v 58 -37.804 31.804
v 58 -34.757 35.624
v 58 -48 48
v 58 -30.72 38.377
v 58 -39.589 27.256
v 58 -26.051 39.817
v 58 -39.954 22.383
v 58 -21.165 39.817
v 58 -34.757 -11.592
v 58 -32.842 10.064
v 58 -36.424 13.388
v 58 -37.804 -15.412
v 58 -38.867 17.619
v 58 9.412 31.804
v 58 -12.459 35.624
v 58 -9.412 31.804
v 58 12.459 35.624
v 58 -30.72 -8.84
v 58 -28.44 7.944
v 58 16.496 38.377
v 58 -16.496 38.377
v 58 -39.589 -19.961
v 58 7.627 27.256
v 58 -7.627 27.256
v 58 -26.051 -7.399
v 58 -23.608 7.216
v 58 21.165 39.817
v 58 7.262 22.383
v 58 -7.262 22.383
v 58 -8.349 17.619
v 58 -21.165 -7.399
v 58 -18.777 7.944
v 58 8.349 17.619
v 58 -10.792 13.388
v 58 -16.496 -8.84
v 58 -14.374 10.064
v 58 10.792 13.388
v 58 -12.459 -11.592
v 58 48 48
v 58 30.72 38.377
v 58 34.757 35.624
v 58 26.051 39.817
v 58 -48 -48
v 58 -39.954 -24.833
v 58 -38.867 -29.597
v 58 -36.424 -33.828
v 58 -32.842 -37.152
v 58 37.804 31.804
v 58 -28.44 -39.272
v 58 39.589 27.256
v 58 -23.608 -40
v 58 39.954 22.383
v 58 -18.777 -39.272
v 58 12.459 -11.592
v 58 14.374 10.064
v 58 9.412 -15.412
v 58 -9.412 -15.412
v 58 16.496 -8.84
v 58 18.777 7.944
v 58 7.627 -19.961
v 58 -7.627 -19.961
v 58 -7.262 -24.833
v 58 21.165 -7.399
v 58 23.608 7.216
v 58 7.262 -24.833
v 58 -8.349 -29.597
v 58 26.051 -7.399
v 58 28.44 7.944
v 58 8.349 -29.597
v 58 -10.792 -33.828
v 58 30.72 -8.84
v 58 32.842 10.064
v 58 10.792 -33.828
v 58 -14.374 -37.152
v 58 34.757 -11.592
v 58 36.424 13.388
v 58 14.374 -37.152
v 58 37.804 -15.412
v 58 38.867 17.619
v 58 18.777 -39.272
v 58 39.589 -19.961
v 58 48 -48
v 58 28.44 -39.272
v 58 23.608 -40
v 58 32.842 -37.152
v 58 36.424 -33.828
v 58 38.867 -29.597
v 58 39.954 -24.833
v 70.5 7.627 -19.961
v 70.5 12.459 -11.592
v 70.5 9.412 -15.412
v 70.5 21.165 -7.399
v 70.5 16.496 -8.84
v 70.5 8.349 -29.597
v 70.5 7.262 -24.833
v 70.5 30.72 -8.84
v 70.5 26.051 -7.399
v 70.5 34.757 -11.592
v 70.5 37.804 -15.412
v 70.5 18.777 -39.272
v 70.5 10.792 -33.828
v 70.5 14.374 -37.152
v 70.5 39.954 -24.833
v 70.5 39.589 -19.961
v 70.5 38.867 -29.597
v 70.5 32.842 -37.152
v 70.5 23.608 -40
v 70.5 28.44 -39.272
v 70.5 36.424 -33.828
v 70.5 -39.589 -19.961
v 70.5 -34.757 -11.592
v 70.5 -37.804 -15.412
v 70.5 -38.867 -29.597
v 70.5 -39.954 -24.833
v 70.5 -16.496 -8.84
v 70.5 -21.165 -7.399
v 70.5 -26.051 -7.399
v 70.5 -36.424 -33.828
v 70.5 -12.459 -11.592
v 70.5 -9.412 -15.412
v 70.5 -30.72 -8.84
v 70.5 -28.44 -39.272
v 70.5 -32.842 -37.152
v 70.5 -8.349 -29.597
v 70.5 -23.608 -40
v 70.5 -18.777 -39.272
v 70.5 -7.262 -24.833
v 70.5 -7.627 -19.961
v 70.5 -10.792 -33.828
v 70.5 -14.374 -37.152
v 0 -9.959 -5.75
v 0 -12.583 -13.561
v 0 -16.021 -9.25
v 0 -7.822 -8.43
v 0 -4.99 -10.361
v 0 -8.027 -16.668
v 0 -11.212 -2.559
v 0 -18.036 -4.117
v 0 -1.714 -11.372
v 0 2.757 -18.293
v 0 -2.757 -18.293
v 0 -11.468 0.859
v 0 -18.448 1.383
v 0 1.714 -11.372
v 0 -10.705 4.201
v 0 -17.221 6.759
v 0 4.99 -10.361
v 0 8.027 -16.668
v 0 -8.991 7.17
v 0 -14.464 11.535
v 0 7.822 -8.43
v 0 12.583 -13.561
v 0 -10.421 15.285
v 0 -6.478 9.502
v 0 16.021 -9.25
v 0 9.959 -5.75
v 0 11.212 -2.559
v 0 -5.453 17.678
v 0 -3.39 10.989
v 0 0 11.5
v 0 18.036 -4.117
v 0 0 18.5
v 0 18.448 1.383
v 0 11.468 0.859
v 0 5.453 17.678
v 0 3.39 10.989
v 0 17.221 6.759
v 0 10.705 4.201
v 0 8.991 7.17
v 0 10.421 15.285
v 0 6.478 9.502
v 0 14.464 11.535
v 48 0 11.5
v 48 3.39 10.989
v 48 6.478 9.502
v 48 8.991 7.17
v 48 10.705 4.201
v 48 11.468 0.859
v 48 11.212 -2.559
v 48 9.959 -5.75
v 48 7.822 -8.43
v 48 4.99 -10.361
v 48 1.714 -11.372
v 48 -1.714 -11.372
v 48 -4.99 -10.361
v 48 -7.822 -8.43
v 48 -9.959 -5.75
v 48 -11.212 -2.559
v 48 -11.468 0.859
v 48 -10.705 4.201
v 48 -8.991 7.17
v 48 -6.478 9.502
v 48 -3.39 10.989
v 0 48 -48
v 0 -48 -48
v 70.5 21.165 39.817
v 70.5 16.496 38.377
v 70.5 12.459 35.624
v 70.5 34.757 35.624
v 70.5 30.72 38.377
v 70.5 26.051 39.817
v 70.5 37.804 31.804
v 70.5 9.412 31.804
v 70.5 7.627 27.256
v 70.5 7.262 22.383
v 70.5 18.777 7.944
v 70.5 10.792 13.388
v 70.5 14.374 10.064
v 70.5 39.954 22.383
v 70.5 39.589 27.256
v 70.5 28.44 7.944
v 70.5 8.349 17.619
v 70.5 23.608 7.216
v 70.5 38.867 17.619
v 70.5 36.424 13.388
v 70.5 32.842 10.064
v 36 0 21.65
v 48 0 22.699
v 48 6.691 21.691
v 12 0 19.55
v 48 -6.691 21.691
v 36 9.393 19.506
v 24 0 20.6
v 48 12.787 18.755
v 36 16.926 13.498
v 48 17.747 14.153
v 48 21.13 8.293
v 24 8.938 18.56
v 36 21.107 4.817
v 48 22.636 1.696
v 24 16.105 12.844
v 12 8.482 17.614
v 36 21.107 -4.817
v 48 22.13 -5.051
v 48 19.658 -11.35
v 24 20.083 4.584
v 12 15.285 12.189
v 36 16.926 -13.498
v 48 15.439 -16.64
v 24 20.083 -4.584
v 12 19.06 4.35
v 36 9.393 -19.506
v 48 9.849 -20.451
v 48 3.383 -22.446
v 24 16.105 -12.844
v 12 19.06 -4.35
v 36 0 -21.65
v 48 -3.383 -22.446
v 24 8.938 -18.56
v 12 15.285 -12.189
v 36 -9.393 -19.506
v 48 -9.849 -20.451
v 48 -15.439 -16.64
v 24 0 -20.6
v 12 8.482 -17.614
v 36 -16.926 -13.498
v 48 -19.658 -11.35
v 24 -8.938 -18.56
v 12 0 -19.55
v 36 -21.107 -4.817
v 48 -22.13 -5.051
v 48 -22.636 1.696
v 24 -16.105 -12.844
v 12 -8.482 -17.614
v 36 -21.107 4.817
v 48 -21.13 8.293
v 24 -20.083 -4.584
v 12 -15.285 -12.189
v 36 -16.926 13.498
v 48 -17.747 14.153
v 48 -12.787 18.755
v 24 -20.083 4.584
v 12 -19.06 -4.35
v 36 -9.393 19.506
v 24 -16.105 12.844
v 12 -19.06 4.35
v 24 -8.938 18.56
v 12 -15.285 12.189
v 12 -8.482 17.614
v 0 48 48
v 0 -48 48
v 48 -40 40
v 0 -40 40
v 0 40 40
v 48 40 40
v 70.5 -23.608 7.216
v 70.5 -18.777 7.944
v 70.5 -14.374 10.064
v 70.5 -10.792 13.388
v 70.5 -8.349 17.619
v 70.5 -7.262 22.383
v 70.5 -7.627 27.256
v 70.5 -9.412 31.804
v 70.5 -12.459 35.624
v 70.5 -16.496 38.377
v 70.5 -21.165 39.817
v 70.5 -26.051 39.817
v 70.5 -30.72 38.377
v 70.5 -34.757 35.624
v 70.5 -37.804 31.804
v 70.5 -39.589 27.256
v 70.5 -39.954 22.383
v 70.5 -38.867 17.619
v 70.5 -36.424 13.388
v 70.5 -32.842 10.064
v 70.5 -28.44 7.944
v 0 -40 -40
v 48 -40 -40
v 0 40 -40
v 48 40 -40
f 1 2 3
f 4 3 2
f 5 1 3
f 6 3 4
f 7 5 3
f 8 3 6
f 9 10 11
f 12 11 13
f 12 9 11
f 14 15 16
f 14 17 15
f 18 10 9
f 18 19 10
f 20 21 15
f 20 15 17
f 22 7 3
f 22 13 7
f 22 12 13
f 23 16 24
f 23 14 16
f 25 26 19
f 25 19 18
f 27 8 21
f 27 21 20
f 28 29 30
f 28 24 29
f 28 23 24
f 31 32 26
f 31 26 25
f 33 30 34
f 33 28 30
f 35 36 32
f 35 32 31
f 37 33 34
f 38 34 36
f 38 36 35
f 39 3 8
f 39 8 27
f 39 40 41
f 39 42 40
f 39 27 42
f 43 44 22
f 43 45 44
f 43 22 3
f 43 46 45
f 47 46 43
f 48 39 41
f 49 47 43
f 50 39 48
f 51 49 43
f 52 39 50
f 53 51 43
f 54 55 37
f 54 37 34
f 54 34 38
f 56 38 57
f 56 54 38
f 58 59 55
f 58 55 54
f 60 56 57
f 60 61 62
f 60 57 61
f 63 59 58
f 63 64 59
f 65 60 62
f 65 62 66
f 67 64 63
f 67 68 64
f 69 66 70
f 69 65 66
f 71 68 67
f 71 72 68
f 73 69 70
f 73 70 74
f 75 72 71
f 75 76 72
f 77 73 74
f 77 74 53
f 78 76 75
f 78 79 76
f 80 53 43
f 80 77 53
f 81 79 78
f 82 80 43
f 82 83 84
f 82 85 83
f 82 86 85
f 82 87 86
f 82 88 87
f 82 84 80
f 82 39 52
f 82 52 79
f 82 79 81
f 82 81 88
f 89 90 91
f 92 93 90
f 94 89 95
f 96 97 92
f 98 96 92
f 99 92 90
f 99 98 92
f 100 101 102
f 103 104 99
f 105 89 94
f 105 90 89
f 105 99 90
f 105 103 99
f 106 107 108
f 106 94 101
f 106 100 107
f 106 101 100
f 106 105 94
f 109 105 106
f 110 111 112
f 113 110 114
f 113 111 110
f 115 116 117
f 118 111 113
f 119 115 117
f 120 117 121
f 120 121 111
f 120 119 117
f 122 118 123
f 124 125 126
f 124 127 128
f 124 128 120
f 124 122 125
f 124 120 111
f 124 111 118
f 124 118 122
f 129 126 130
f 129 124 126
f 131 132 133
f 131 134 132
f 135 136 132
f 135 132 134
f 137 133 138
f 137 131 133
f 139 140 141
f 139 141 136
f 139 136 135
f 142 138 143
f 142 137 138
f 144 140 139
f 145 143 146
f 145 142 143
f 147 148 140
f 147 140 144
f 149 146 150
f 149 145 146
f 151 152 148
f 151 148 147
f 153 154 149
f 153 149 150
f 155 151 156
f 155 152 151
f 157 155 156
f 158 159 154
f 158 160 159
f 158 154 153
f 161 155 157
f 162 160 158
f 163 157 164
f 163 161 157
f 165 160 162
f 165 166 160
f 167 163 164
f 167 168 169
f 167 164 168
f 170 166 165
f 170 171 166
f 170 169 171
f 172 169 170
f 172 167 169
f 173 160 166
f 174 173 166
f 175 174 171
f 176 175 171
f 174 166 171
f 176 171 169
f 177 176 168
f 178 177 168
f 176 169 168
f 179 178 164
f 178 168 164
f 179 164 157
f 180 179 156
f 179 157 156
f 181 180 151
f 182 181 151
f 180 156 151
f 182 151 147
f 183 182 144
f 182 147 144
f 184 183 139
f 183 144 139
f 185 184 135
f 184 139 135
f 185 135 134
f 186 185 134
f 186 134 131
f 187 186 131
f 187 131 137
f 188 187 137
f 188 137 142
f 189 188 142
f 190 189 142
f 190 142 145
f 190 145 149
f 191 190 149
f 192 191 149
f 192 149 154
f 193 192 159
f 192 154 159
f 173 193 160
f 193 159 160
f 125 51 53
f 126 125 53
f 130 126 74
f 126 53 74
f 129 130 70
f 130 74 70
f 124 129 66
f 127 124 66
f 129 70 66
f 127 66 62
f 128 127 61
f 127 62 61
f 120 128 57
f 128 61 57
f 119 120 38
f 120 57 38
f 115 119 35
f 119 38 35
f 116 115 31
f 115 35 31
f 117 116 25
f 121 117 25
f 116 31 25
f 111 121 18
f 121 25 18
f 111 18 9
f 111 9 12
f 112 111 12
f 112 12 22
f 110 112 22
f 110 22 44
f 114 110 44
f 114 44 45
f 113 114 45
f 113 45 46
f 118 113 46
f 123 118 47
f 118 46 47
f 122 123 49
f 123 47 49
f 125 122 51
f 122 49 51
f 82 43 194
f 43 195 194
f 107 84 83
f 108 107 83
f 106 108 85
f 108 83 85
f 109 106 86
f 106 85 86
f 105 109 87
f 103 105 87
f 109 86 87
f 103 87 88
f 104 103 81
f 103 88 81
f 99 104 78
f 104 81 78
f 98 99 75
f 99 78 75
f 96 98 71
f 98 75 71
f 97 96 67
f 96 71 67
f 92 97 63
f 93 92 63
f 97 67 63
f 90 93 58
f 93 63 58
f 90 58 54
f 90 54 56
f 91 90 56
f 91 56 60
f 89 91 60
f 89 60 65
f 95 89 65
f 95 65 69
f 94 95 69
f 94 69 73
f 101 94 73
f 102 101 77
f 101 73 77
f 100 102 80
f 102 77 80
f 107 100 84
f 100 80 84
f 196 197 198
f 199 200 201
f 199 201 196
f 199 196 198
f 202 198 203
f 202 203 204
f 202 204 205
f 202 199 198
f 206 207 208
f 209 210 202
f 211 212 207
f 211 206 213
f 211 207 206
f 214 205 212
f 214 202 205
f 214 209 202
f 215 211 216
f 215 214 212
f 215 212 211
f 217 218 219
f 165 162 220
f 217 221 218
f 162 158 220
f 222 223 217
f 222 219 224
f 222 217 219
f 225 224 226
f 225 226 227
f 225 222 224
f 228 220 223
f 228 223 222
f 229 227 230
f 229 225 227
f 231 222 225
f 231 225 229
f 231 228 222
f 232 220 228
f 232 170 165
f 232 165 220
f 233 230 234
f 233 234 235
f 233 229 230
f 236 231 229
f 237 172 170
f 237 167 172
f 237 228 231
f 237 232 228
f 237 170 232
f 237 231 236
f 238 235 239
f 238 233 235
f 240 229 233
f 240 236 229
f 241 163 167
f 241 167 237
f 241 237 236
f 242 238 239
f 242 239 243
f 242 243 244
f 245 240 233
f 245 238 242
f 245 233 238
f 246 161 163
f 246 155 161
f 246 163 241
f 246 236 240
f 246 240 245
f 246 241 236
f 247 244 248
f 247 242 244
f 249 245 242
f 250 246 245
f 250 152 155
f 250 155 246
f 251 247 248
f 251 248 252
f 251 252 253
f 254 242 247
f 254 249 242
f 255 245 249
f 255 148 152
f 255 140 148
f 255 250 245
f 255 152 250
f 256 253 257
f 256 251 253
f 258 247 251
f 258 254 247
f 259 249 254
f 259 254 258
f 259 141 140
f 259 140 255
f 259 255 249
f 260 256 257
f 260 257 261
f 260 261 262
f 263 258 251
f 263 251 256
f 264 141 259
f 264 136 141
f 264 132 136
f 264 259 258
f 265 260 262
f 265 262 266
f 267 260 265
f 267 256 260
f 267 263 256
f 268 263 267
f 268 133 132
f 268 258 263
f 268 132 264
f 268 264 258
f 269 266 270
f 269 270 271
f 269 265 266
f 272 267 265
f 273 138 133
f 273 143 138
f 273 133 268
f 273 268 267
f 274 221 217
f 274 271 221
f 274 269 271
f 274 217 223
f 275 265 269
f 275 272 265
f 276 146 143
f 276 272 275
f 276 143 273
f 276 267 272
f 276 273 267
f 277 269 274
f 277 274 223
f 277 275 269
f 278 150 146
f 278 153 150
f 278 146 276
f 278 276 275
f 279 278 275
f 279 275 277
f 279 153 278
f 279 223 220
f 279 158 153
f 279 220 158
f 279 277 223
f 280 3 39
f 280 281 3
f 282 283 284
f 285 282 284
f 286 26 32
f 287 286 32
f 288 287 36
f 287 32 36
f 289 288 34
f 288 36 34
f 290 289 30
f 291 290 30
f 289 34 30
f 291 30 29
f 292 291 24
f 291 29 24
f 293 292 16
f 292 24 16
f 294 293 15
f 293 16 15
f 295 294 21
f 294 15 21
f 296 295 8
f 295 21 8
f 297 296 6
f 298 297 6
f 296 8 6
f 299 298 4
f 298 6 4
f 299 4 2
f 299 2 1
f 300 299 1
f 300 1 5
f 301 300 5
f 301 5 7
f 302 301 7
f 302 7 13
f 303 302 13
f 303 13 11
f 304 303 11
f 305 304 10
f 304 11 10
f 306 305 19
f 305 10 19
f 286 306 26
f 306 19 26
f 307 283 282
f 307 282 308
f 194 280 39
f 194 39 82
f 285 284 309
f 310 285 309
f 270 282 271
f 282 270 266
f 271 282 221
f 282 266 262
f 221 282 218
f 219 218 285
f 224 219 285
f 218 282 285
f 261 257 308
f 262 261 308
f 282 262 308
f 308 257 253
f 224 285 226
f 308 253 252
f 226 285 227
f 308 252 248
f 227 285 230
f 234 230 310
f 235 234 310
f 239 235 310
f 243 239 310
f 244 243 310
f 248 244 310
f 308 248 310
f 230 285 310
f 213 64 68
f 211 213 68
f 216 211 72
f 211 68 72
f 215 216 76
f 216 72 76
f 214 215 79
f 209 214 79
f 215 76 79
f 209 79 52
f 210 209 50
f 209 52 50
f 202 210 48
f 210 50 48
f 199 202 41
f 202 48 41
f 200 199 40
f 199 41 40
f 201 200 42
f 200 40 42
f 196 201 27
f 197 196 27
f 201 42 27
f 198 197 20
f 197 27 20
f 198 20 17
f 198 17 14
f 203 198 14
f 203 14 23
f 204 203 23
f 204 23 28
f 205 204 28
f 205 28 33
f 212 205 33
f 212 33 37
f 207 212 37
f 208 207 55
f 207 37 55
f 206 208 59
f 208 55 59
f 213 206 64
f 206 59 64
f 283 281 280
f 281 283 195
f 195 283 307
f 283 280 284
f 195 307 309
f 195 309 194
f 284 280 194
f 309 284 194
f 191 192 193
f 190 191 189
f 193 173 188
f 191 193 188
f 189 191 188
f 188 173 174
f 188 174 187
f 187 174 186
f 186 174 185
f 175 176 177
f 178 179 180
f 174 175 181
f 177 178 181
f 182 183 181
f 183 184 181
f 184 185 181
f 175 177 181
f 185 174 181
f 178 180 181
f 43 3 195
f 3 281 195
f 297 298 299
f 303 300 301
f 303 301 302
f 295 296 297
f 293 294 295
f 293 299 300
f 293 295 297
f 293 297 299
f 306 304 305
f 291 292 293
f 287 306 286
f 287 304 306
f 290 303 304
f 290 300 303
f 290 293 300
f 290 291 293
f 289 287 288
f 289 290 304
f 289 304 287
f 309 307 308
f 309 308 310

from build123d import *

# Parameters (mm, degrees)
ESQUISSE5_W        = 96
ESQUISSE5_H        = 96
ESQUISSE5_W_2      = 80
ESQUISSE5_H_2      = 80
BOSS_EXTRU_1_DEPTH = 48
ESQUISSE6_W        = 96
ESQUISSE6_H        = 96
BOSS_EXTRU_3_DEPTH = 10
ESQUISSE7_R        = 16.391900089
BOSS_EXTRU_4_DEPTH = 12.5
ESQUISSE8_R        = 18.5
ESQUISSE8_R_2      = 11.5
BOSS_EXTRU_5_DEPTH = 48
CHANFREIN2_SIZE2   = 48
CHANFREIN2_SIZE    = 4.199455849


with BuildPart() as part:
    # Esquisse5 → Boss.-Extru.1 (new body)
    with BuildSketch(Plane(origin=(0, 0, 0), x_dir=(0, 0, -1), z_dir=(1, 0, 0))):
        Rectangle(ESQUISSE5_W, ESQUISSE5_H)
        Rectangle(ESQUISSE5_W_2, ESQUISSE5_H_2, mode=Mode.SUBTRACT)
    extrude(amount=BOSS_EXTRU_1_DEPTH)

    # Esquisse6 → Boss.-Extru.3 (add)
    with BuildSketch(Plane(origin=(48, 0, 0), x_dir=(0, 0, -1), z_dir=(1, 0, 0))):
        Rectangle(ESQUISSE6_W, ESQUISSE6_H)
    extrude(amount=BOSS_EXTRU_3_DEPTH)

    # Esquisse7 → Boss.-Extru.4 (add)
    with BuildSketch(Plane(origin=(58, 0, 0), x_dir=(0, 0, -1), z_dir=(1, 0, 0))):
        with Locations((23.608099911, 23.608099911)):
            Circle(ESQUISSE7_R)
        with Locations((23.608099911, -23.608099911)):
            Circle(ESQUISSE7_R)
        with Locations((-23.608099911, -23.608099911)):
            Circle(ESQUISSE7_R)
        with Locations((-23.608099911, 23.608099911)):
            Circle(ESQUISSE7_R)
    extrude(amount=BOSS_EXTRU_4_DEPTH)

    # Esquisse8 → Boss.-Extru.5 (add)
    with BuildSketch(Plane.ZY):
        Circle(ESQUISSE8_R)
        Circle(ESQUISSE8_R_2, mode=Mode.SUBTRACT)
    extrude(amount=-BOSS_EXTRU_5_DEPTH)

    # Chanfrein2
    chanfrein2_edges = [part.edges().sort_by_distance(p)[0] for p in [
        (48, 0, -18.5),
    ]]
    chanfrein2_side = [part.faces().sort_by_distance(p)[0] for p in [
        (48, 0, -18.583989117),
    ]]
    chamfer(chanfrein2_edges, length=CHANFREIN2_SIZE - 0.0001, length2=CHANFREIN2_SIZE2 - 0.0001, reference=chanfrein2_side[0])  # a hair under: the kernel refuses the full size


solid = part.part
